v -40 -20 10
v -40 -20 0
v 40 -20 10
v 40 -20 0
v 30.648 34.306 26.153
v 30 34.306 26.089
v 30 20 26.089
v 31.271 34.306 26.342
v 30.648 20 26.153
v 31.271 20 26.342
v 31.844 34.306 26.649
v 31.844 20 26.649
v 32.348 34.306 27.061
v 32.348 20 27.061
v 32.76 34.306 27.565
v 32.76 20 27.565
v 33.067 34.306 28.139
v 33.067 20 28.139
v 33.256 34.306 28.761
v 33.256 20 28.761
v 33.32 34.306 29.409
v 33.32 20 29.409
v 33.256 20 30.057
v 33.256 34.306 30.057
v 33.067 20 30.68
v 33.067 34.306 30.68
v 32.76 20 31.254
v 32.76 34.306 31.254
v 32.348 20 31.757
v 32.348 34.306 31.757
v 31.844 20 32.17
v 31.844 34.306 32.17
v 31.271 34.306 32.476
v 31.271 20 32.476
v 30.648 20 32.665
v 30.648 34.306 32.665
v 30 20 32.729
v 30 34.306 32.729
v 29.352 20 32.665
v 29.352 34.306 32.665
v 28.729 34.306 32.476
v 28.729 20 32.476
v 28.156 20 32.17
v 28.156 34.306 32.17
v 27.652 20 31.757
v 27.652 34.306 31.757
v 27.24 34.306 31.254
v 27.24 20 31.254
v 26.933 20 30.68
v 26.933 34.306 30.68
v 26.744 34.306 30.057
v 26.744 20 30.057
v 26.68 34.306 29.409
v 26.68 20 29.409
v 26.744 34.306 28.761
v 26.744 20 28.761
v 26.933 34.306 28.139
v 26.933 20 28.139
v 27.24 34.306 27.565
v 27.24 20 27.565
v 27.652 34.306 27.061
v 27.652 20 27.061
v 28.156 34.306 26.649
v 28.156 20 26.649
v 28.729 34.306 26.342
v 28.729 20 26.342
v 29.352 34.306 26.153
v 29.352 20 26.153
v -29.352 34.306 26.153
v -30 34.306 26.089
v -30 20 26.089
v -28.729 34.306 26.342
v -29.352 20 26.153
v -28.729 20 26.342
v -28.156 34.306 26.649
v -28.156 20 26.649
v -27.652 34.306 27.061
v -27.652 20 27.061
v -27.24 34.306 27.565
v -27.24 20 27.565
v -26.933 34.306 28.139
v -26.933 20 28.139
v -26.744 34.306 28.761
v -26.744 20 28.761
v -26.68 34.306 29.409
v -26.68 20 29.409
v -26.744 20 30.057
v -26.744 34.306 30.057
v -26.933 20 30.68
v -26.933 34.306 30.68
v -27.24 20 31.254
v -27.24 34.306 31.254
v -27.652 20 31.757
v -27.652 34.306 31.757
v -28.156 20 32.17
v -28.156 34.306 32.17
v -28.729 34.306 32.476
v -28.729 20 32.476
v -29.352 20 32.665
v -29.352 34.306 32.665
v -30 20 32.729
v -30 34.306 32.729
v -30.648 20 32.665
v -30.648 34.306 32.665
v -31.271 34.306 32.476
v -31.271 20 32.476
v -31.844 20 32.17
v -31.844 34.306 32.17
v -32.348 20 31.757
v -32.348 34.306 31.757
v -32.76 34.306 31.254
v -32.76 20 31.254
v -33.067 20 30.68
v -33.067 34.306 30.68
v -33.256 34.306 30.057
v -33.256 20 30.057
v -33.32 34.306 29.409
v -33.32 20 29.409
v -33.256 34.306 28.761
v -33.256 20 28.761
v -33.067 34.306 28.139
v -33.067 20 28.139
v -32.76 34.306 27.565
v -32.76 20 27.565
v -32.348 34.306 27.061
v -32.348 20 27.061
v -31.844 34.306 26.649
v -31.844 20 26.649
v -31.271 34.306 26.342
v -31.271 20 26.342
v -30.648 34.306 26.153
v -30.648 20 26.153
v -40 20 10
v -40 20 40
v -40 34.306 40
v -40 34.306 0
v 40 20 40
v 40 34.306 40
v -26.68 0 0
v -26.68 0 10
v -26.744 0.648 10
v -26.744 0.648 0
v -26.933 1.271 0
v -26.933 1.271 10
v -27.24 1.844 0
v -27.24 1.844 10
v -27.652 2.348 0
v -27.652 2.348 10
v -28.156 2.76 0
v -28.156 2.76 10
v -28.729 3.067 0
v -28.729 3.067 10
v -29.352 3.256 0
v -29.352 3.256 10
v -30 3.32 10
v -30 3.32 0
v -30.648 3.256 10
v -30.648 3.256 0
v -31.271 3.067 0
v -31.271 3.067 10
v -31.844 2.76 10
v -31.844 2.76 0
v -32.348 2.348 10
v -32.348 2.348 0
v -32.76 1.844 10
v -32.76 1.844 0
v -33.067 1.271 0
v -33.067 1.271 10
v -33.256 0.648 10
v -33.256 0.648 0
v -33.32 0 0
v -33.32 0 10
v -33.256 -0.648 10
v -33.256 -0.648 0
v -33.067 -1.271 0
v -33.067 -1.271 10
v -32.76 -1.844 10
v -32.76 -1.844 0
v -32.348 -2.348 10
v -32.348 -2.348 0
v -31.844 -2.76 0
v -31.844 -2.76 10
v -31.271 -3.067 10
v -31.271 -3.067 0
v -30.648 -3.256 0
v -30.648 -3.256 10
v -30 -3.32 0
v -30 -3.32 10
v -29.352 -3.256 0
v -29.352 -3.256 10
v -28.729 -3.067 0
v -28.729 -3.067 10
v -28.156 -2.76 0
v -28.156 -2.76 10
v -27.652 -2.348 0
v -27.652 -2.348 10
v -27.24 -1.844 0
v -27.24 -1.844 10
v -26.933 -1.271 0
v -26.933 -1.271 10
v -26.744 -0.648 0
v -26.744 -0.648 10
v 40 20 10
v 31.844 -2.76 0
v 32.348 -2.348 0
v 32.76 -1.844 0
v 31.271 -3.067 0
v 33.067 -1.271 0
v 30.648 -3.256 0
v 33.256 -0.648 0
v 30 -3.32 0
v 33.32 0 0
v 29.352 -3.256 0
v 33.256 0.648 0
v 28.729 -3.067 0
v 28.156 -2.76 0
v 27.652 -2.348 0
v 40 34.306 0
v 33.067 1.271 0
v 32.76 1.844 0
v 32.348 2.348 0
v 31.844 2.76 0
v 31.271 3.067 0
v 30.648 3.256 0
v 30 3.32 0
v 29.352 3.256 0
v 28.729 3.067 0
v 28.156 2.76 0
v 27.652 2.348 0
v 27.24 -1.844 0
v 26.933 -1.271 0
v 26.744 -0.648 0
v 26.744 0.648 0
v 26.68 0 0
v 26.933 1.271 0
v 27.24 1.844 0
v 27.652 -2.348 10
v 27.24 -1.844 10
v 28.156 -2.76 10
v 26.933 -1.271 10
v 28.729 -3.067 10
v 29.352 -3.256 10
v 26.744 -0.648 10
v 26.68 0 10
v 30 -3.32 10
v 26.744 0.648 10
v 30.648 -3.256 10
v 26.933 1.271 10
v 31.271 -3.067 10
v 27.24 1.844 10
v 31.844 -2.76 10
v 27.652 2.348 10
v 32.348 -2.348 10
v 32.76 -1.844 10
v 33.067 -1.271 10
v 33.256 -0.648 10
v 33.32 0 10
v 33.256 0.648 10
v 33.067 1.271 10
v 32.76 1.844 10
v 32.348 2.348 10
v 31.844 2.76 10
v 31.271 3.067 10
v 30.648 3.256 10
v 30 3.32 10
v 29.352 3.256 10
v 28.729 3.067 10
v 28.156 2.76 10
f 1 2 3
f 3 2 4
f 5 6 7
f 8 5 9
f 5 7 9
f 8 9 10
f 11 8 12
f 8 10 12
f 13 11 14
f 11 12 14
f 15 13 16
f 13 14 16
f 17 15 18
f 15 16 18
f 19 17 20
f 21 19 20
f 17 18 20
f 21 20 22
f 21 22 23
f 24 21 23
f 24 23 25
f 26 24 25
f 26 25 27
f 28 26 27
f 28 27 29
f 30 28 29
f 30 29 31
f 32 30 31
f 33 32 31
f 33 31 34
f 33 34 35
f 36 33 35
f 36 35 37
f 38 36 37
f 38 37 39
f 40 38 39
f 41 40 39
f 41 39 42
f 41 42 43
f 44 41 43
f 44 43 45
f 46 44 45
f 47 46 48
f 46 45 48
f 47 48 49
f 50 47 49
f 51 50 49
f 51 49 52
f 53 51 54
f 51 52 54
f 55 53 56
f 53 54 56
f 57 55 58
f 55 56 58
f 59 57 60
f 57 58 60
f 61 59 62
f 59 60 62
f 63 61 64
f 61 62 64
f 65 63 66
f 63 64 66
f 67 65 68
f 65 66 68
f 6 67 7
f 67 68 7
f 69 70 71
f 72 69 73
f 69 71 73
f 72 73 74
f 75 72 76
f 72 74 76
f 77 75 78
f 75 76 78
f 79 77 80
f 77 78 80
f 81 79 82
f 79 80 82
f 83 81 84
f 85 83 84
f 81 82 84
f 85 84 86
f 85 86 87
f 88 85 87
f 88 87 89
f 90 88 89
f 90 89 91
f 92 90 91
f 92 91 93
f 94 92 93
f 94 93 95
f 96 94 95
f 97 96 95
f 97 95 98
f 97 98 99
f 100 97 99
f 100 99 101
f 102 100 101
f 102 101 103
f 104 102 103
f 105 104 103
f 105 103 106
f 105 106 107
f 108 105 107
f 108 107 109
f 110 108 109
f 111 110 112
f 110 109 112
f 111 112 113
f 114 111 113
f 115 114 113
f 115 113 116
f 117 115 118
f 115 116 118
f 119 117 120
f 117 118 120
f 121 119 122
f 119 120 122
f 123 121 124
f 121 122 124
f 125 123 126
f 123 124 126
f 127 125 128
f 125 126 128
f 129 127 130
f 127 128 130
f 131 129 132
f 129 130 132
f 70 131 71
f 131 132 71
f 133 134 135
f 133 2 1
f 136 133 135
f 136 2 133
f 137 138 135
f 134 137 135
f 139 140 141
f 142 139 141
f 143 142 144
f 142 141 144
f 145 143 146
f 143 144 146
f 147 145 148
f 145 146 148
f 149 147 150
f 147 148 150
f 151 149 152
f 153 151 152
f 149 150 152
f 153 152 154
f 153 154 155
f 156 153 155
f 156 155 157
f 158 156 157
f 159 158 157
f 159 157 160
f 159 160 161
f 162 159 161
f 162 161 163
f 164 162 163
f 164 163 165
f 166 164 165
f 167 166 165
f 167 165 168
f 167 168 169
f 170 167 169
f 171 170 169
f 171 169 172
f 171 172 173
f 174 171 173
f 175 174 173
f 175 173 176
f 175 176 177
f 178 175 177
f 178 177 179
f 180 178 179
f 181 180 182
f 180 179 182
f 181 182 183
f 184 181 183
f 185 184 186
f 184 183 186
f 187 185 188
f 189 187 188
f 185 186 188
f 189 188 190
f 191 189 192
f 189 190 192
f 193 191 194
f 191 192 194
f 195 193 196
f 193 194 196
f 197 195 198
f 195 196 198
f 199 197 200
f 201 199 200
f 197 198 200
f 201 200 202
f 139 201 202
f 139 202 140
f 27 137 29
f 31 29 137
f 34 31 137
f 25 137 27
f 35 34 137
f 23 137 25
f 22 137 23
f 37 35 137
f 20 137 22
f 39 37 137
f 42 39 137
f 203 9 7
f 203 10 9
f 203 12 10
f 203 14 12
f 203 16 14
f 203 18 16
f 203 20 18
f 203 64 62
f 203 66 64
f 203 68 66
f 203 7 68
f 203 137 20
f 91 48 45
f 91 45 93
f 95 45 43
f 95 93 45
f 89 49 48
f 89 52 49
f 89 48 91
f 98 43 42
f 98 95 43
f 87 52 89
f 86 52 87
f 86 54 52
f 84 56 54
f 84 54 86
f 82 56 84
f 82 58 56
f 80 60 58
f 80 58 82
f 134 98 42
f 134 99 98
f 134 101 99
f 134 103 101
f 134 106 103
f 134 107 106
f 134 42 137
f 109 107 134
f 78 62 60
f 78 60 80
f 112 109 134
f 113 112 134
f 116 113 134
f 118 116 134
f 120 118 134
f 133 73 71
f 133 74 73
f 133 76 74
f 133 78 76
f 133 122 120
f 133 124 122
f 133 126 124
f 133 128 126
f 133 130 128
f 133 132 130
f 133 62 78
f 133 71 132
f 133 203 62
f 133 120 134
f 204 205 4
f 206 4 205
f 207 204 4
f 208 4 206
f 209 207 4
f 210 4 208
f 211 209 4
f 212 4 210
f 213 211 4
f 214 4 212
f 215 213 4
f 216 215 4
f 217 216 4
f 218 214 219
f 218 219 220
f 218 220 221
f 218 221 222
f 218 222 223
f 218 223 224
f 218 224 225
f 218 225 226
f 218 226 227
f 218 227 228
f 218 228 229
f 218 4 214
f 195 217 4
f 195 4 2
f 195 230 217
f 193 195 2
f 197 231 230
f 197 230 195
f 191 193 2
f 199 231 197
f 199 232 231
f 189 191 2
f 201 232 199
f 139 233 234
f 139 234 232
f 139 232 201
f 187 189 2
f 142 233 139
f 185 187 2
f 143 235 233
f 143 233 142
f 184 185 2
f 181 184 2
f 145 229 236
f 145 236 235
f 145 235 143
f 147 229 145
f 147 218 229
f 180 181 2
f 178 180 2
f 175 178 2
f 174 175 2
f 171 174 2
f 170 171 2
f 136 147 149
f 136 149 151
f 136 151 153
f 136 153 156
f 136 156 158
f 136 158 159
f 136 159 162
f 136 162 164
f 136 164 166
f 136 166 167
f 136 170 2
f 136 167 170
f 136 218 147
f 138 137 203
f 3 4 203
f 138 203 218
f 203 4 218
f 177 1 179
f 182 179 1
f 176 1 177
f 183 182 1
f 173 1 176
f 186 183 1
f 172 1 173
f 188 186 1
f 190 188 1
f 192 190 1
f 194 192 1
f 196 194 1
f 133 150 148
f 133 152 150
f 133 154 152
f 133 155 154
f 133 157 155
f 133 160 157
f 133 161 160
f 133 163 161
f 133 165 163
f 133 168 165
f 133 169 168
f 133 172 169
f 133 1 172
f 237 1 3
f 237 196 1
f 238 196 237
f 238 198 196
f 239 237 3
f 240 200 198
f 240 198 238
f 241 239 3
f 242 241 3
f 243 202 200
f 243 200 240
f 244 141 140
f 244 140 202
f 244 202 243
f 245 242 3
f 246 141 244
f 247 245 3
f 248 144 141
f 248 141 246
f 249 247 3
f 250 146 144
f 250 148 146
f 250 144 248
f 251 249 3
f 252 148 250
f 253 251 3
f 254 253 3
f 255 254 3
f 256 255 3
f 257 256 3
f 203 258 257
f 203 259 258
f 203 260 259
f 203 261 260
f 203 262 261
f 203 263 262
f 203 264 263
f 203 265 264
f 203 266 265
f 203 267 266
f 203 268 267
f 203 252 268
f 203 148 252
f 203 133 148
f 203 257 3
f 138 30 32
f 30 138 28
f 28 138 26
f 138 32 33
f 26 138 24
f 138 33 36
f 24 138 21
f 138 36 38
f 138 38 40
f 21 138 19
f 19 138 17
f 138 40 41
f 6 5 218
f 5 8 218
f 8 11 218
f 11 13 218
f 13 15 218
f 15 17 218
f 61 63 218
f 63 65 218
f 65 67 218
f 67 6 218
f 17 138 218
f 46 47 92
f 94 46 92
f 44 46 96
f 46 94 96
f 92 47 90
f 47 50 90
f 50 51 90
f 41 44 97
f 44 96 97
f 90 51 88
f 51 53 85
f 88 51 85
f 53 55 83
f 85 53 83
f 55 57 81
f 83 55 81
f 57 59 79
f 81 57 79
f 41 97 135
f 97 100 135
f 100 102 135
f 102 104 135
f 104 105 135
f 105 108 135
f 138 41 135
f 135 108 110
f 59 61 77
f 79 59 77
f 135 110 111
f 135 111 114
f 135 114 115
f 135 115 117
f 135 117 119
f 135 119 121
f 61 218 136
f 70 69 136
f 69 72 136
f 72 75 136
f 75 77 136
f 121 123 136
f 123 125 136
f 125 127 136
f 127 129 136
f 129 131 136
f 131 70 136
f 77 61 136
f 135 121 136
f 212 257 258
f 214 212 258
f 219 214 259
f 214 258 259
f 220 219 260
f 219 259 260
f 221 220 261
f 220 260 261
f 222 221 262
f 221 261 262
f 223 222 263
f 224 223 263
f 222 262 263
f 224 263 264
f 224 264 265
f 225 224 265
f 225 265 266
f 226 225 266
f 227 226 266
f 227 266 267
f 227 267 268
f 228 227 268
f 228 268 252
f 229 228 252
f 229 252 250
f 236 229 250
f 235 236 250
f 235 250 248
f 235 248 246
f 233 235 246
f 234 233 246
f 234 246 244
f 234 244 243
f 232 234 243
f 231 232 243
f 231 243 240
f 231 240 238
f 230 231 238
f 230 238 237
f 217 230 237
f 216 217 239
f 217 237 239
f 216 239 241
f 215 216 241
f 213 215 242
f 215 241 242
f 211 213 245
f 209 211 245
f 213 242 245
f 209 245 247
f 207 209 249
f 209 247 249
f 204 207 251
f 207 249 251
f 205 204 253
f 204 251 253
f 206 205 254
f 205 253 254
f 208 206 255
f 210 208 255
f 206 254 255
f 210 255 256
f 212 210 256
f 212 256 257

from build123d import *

# Parameters (mm, degrees)
SKETCH_1_W          = 80
SKETCH_1_H          = 40
EXTRUDE_1_DEPTH     = 10
SKETCH_4_R          = 3.32
CUT_EXTRUDE_3_DEPTH = 46.82575695
SKETCH_2_W          = 80
SKETCH_2_H          = 14.306395687
EXTRUDE_3_DEPTH     = 40
SKETCH_5_R          = 3.32
CUT_EXTRUDE_4_DEPTH = 40


with BuildPart() as part:
    # 草图1 → 凸台-拉伸1 (new body)
    with BuildSketch(Plane.XY):
        Rectangle(SKETCH_1_W, SKETCH_1_H)
    extrude(amount=EXTRUDE_1_DEPTH)

    # 草图4 → 切除-拉伸3 (cut, through all)
    with BuildSketch(Plane.XY.offset(10)):
        with Locations((30, 0)):
            Circle(SKETCH_4_R)
        with Locations((-30, 0)):
            Circle(SKETCH_4_R)
    extrude(amount=-CUT_EXTRUDE_3_DEPTH, mode=Mode.SUBTRACT)

    # 草图2 → 凸台-拉伸3 (add)
    with BuildSketch(Plane(origin=(0, 0, 0), x_dir=(-1, 0, 0), z_dir=(0, 0, -1))):
        with Locations((0, 27.153197844)):
            Rectangle(SKETCH_2_W, SKETCH_2_H)
    extrude(amount=-EXTRUDE_3_DEPTH)

    # 草图5 → 切除-拉伸4 (cut)
    with BuildSketch(Plane.XZ.offset(-20)):
        with Locations(Location((30, 29.40906451, 0), (0, 0, 270))):
            Circle(SKETCH_5_R)
        with Locations(Location((-30, 29.40906451, 0), (0, 0, 270))):
            Circle(SKETCH_5_R)
    extrude(amount=-CUT_EXTRUDE_4_DEPTH, mode=Mode.SUBTRACT)


solid = part.part
